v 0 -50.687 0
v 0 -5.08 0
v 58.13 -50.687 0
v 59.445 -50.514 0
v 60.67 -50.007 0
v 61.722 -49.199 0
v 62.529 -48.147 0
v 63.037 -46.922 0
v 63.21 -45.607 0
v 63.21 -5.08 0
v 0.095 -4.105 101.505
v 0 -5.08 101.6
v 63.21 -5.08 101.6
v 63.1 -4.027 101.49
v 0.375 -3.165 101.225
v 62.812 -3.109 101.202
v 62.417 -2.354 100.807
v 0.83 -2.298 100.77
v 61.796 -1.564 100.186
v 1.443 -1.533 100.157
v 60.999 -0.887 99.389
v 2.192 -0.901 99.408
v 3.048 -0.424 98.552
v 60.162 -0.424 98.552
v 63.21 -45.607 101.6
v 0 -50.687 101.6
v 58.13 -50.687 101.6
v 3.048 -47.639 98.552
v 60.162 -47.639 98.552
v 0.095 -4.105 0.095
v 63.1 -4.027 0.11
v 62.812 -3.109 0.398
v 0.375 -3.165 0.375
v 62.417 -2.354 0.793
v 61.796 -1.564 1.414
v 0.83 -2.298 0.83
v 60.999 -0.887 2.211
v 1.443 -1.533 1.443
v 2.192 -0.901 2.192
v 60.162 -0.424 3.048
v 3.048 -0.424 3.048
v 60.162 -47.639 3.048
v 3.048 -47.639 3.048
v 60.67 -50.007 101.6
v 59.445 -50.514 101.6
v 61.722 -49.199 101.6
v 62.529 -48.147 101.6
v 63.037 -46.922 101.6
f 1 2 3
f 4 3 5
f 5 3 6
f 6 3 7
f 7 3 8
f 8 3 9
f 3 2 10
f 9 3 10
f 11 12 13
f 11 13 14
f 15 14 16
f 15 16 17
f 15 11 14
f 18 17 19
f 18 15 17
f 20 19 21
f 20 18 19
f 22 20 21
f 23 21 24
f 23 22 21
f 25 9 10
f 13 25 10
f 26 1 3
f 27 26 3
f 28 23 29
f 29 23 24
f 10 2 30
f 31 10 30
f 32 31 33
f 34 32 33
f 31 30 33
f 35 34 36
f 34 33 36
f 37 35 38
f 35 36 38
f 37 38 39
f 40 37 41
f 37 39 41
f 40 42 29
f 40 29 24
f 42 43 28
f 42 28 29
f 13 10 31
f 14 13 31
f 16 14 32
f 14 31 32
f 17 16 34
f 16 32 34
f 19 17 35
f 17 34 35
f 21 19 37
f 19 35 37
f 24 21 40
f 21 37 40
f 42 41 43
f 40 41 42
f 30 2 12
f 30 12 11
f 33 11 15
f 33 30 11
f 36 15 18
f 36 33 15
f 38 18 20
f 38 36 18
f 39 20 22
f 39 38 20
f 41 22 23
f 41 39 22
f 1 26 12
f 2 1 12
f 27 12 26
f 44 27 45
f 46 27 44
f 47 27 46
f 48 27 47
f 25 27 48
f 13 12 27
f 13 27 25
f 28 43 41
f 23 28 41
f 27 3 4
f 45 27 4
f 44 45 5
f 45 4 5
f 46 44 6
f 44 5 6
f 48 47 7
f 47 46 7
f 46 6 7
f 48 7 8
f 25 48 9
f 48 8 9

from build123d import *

# Parameters (mm, degrees)
F0_W        = 63.2100254297
F0_H        = 50.6872721016
F1_DEPTH    = 101.6
F2_T        = -3.048
F3_T1_DEPTH = 127
F3_T3_DEPTH = 88.6100254297


# Not quite as in the source:
# - a fillet or chamfer that OpenCascade refuses, or shapes differently, is made with other operations: its cross-section is extruded or revolved along the edge and cut away or added


with BuildPart() as f1:
    # F0 (on Top) → F1 (new body)
    with BuildSketch(Plane.XY):
        with Locations((31.6050127149, -25.3436360508)):
            Rectangle(F0_W, F0_H)
    extrude(amount=F1_DEPTH)

    # F2
    f2_openings = [f1.faces().sort_by_distance(p)[0] for p in [
        (31.605013, 0, 50.8),
    ]]
    offset(amount=F2_T, openings=f2_openings)

    # F3: fillet of radius 5.08 on 5 edges, made by hand

    # F3_s2 → F3_t1 (cut)
    with BuildSketch(Plane.XY.offset(-12.7)):
        with BuildLine():
            ThreePointArc((0, -5.08), (1.4878975516, -1.4878975516), (5.08, 0))
            Line((5.08, 0), (0, 0))
            Line((0, 0), (0, -5.08))
        make_face()
        with BuildLine():
            ThreePointArc((63.2100254297, -5.08), (61.7221278782, -1.4878975516), (58.1300254297, 0))
            Line((58.1300254297, 0), (63.2100254297, 0))
            Line((63.2100254297, 0), (63.2100254297, -5.08))
        make_face()
        with BuildLine():
            ThreePointArc((58.1300254297, -50.6872721016), (61.7221278782, -49.1993745501), (63.2100254297, -45.6072721016))
            Line((63.2100254297, -45.6072721016), (63.2100254297, -50.6872721016))
            Line((63.2100254297, -50.6872721016), (58.1300254297, -50.6872721016))
        make_face()
    extrude(amount=F3_T1_DEPTH, mode=Mode.SUBTRACT)

    # F3_s4 → F3_t3 (cut)
    with BuildSketch(Plane.YZ.offset(-12.7)):
        with BuildLine():
            ThreePointArc((-5.08, 101.6), (-1.4878975516, 100.1121024484), (0, 96.52))
            Line((0, 96.52), (0, 101.6))
            Line((0, 101.6), (-5.08, 101.6))
        make_face()
        with BuildLine():
            ThreePointArc((-5.08, 0), (-1.4878975516, 1.4878975516), (0, 5.08))
            Line((0, 5.08), (0, 0))
            Line((0, 0), (-5.08, 0))
        make_face()
    extrude(amount=F3_T3_DEPTH, mode=Mode.SUBTRACT)


solid = f1.part
